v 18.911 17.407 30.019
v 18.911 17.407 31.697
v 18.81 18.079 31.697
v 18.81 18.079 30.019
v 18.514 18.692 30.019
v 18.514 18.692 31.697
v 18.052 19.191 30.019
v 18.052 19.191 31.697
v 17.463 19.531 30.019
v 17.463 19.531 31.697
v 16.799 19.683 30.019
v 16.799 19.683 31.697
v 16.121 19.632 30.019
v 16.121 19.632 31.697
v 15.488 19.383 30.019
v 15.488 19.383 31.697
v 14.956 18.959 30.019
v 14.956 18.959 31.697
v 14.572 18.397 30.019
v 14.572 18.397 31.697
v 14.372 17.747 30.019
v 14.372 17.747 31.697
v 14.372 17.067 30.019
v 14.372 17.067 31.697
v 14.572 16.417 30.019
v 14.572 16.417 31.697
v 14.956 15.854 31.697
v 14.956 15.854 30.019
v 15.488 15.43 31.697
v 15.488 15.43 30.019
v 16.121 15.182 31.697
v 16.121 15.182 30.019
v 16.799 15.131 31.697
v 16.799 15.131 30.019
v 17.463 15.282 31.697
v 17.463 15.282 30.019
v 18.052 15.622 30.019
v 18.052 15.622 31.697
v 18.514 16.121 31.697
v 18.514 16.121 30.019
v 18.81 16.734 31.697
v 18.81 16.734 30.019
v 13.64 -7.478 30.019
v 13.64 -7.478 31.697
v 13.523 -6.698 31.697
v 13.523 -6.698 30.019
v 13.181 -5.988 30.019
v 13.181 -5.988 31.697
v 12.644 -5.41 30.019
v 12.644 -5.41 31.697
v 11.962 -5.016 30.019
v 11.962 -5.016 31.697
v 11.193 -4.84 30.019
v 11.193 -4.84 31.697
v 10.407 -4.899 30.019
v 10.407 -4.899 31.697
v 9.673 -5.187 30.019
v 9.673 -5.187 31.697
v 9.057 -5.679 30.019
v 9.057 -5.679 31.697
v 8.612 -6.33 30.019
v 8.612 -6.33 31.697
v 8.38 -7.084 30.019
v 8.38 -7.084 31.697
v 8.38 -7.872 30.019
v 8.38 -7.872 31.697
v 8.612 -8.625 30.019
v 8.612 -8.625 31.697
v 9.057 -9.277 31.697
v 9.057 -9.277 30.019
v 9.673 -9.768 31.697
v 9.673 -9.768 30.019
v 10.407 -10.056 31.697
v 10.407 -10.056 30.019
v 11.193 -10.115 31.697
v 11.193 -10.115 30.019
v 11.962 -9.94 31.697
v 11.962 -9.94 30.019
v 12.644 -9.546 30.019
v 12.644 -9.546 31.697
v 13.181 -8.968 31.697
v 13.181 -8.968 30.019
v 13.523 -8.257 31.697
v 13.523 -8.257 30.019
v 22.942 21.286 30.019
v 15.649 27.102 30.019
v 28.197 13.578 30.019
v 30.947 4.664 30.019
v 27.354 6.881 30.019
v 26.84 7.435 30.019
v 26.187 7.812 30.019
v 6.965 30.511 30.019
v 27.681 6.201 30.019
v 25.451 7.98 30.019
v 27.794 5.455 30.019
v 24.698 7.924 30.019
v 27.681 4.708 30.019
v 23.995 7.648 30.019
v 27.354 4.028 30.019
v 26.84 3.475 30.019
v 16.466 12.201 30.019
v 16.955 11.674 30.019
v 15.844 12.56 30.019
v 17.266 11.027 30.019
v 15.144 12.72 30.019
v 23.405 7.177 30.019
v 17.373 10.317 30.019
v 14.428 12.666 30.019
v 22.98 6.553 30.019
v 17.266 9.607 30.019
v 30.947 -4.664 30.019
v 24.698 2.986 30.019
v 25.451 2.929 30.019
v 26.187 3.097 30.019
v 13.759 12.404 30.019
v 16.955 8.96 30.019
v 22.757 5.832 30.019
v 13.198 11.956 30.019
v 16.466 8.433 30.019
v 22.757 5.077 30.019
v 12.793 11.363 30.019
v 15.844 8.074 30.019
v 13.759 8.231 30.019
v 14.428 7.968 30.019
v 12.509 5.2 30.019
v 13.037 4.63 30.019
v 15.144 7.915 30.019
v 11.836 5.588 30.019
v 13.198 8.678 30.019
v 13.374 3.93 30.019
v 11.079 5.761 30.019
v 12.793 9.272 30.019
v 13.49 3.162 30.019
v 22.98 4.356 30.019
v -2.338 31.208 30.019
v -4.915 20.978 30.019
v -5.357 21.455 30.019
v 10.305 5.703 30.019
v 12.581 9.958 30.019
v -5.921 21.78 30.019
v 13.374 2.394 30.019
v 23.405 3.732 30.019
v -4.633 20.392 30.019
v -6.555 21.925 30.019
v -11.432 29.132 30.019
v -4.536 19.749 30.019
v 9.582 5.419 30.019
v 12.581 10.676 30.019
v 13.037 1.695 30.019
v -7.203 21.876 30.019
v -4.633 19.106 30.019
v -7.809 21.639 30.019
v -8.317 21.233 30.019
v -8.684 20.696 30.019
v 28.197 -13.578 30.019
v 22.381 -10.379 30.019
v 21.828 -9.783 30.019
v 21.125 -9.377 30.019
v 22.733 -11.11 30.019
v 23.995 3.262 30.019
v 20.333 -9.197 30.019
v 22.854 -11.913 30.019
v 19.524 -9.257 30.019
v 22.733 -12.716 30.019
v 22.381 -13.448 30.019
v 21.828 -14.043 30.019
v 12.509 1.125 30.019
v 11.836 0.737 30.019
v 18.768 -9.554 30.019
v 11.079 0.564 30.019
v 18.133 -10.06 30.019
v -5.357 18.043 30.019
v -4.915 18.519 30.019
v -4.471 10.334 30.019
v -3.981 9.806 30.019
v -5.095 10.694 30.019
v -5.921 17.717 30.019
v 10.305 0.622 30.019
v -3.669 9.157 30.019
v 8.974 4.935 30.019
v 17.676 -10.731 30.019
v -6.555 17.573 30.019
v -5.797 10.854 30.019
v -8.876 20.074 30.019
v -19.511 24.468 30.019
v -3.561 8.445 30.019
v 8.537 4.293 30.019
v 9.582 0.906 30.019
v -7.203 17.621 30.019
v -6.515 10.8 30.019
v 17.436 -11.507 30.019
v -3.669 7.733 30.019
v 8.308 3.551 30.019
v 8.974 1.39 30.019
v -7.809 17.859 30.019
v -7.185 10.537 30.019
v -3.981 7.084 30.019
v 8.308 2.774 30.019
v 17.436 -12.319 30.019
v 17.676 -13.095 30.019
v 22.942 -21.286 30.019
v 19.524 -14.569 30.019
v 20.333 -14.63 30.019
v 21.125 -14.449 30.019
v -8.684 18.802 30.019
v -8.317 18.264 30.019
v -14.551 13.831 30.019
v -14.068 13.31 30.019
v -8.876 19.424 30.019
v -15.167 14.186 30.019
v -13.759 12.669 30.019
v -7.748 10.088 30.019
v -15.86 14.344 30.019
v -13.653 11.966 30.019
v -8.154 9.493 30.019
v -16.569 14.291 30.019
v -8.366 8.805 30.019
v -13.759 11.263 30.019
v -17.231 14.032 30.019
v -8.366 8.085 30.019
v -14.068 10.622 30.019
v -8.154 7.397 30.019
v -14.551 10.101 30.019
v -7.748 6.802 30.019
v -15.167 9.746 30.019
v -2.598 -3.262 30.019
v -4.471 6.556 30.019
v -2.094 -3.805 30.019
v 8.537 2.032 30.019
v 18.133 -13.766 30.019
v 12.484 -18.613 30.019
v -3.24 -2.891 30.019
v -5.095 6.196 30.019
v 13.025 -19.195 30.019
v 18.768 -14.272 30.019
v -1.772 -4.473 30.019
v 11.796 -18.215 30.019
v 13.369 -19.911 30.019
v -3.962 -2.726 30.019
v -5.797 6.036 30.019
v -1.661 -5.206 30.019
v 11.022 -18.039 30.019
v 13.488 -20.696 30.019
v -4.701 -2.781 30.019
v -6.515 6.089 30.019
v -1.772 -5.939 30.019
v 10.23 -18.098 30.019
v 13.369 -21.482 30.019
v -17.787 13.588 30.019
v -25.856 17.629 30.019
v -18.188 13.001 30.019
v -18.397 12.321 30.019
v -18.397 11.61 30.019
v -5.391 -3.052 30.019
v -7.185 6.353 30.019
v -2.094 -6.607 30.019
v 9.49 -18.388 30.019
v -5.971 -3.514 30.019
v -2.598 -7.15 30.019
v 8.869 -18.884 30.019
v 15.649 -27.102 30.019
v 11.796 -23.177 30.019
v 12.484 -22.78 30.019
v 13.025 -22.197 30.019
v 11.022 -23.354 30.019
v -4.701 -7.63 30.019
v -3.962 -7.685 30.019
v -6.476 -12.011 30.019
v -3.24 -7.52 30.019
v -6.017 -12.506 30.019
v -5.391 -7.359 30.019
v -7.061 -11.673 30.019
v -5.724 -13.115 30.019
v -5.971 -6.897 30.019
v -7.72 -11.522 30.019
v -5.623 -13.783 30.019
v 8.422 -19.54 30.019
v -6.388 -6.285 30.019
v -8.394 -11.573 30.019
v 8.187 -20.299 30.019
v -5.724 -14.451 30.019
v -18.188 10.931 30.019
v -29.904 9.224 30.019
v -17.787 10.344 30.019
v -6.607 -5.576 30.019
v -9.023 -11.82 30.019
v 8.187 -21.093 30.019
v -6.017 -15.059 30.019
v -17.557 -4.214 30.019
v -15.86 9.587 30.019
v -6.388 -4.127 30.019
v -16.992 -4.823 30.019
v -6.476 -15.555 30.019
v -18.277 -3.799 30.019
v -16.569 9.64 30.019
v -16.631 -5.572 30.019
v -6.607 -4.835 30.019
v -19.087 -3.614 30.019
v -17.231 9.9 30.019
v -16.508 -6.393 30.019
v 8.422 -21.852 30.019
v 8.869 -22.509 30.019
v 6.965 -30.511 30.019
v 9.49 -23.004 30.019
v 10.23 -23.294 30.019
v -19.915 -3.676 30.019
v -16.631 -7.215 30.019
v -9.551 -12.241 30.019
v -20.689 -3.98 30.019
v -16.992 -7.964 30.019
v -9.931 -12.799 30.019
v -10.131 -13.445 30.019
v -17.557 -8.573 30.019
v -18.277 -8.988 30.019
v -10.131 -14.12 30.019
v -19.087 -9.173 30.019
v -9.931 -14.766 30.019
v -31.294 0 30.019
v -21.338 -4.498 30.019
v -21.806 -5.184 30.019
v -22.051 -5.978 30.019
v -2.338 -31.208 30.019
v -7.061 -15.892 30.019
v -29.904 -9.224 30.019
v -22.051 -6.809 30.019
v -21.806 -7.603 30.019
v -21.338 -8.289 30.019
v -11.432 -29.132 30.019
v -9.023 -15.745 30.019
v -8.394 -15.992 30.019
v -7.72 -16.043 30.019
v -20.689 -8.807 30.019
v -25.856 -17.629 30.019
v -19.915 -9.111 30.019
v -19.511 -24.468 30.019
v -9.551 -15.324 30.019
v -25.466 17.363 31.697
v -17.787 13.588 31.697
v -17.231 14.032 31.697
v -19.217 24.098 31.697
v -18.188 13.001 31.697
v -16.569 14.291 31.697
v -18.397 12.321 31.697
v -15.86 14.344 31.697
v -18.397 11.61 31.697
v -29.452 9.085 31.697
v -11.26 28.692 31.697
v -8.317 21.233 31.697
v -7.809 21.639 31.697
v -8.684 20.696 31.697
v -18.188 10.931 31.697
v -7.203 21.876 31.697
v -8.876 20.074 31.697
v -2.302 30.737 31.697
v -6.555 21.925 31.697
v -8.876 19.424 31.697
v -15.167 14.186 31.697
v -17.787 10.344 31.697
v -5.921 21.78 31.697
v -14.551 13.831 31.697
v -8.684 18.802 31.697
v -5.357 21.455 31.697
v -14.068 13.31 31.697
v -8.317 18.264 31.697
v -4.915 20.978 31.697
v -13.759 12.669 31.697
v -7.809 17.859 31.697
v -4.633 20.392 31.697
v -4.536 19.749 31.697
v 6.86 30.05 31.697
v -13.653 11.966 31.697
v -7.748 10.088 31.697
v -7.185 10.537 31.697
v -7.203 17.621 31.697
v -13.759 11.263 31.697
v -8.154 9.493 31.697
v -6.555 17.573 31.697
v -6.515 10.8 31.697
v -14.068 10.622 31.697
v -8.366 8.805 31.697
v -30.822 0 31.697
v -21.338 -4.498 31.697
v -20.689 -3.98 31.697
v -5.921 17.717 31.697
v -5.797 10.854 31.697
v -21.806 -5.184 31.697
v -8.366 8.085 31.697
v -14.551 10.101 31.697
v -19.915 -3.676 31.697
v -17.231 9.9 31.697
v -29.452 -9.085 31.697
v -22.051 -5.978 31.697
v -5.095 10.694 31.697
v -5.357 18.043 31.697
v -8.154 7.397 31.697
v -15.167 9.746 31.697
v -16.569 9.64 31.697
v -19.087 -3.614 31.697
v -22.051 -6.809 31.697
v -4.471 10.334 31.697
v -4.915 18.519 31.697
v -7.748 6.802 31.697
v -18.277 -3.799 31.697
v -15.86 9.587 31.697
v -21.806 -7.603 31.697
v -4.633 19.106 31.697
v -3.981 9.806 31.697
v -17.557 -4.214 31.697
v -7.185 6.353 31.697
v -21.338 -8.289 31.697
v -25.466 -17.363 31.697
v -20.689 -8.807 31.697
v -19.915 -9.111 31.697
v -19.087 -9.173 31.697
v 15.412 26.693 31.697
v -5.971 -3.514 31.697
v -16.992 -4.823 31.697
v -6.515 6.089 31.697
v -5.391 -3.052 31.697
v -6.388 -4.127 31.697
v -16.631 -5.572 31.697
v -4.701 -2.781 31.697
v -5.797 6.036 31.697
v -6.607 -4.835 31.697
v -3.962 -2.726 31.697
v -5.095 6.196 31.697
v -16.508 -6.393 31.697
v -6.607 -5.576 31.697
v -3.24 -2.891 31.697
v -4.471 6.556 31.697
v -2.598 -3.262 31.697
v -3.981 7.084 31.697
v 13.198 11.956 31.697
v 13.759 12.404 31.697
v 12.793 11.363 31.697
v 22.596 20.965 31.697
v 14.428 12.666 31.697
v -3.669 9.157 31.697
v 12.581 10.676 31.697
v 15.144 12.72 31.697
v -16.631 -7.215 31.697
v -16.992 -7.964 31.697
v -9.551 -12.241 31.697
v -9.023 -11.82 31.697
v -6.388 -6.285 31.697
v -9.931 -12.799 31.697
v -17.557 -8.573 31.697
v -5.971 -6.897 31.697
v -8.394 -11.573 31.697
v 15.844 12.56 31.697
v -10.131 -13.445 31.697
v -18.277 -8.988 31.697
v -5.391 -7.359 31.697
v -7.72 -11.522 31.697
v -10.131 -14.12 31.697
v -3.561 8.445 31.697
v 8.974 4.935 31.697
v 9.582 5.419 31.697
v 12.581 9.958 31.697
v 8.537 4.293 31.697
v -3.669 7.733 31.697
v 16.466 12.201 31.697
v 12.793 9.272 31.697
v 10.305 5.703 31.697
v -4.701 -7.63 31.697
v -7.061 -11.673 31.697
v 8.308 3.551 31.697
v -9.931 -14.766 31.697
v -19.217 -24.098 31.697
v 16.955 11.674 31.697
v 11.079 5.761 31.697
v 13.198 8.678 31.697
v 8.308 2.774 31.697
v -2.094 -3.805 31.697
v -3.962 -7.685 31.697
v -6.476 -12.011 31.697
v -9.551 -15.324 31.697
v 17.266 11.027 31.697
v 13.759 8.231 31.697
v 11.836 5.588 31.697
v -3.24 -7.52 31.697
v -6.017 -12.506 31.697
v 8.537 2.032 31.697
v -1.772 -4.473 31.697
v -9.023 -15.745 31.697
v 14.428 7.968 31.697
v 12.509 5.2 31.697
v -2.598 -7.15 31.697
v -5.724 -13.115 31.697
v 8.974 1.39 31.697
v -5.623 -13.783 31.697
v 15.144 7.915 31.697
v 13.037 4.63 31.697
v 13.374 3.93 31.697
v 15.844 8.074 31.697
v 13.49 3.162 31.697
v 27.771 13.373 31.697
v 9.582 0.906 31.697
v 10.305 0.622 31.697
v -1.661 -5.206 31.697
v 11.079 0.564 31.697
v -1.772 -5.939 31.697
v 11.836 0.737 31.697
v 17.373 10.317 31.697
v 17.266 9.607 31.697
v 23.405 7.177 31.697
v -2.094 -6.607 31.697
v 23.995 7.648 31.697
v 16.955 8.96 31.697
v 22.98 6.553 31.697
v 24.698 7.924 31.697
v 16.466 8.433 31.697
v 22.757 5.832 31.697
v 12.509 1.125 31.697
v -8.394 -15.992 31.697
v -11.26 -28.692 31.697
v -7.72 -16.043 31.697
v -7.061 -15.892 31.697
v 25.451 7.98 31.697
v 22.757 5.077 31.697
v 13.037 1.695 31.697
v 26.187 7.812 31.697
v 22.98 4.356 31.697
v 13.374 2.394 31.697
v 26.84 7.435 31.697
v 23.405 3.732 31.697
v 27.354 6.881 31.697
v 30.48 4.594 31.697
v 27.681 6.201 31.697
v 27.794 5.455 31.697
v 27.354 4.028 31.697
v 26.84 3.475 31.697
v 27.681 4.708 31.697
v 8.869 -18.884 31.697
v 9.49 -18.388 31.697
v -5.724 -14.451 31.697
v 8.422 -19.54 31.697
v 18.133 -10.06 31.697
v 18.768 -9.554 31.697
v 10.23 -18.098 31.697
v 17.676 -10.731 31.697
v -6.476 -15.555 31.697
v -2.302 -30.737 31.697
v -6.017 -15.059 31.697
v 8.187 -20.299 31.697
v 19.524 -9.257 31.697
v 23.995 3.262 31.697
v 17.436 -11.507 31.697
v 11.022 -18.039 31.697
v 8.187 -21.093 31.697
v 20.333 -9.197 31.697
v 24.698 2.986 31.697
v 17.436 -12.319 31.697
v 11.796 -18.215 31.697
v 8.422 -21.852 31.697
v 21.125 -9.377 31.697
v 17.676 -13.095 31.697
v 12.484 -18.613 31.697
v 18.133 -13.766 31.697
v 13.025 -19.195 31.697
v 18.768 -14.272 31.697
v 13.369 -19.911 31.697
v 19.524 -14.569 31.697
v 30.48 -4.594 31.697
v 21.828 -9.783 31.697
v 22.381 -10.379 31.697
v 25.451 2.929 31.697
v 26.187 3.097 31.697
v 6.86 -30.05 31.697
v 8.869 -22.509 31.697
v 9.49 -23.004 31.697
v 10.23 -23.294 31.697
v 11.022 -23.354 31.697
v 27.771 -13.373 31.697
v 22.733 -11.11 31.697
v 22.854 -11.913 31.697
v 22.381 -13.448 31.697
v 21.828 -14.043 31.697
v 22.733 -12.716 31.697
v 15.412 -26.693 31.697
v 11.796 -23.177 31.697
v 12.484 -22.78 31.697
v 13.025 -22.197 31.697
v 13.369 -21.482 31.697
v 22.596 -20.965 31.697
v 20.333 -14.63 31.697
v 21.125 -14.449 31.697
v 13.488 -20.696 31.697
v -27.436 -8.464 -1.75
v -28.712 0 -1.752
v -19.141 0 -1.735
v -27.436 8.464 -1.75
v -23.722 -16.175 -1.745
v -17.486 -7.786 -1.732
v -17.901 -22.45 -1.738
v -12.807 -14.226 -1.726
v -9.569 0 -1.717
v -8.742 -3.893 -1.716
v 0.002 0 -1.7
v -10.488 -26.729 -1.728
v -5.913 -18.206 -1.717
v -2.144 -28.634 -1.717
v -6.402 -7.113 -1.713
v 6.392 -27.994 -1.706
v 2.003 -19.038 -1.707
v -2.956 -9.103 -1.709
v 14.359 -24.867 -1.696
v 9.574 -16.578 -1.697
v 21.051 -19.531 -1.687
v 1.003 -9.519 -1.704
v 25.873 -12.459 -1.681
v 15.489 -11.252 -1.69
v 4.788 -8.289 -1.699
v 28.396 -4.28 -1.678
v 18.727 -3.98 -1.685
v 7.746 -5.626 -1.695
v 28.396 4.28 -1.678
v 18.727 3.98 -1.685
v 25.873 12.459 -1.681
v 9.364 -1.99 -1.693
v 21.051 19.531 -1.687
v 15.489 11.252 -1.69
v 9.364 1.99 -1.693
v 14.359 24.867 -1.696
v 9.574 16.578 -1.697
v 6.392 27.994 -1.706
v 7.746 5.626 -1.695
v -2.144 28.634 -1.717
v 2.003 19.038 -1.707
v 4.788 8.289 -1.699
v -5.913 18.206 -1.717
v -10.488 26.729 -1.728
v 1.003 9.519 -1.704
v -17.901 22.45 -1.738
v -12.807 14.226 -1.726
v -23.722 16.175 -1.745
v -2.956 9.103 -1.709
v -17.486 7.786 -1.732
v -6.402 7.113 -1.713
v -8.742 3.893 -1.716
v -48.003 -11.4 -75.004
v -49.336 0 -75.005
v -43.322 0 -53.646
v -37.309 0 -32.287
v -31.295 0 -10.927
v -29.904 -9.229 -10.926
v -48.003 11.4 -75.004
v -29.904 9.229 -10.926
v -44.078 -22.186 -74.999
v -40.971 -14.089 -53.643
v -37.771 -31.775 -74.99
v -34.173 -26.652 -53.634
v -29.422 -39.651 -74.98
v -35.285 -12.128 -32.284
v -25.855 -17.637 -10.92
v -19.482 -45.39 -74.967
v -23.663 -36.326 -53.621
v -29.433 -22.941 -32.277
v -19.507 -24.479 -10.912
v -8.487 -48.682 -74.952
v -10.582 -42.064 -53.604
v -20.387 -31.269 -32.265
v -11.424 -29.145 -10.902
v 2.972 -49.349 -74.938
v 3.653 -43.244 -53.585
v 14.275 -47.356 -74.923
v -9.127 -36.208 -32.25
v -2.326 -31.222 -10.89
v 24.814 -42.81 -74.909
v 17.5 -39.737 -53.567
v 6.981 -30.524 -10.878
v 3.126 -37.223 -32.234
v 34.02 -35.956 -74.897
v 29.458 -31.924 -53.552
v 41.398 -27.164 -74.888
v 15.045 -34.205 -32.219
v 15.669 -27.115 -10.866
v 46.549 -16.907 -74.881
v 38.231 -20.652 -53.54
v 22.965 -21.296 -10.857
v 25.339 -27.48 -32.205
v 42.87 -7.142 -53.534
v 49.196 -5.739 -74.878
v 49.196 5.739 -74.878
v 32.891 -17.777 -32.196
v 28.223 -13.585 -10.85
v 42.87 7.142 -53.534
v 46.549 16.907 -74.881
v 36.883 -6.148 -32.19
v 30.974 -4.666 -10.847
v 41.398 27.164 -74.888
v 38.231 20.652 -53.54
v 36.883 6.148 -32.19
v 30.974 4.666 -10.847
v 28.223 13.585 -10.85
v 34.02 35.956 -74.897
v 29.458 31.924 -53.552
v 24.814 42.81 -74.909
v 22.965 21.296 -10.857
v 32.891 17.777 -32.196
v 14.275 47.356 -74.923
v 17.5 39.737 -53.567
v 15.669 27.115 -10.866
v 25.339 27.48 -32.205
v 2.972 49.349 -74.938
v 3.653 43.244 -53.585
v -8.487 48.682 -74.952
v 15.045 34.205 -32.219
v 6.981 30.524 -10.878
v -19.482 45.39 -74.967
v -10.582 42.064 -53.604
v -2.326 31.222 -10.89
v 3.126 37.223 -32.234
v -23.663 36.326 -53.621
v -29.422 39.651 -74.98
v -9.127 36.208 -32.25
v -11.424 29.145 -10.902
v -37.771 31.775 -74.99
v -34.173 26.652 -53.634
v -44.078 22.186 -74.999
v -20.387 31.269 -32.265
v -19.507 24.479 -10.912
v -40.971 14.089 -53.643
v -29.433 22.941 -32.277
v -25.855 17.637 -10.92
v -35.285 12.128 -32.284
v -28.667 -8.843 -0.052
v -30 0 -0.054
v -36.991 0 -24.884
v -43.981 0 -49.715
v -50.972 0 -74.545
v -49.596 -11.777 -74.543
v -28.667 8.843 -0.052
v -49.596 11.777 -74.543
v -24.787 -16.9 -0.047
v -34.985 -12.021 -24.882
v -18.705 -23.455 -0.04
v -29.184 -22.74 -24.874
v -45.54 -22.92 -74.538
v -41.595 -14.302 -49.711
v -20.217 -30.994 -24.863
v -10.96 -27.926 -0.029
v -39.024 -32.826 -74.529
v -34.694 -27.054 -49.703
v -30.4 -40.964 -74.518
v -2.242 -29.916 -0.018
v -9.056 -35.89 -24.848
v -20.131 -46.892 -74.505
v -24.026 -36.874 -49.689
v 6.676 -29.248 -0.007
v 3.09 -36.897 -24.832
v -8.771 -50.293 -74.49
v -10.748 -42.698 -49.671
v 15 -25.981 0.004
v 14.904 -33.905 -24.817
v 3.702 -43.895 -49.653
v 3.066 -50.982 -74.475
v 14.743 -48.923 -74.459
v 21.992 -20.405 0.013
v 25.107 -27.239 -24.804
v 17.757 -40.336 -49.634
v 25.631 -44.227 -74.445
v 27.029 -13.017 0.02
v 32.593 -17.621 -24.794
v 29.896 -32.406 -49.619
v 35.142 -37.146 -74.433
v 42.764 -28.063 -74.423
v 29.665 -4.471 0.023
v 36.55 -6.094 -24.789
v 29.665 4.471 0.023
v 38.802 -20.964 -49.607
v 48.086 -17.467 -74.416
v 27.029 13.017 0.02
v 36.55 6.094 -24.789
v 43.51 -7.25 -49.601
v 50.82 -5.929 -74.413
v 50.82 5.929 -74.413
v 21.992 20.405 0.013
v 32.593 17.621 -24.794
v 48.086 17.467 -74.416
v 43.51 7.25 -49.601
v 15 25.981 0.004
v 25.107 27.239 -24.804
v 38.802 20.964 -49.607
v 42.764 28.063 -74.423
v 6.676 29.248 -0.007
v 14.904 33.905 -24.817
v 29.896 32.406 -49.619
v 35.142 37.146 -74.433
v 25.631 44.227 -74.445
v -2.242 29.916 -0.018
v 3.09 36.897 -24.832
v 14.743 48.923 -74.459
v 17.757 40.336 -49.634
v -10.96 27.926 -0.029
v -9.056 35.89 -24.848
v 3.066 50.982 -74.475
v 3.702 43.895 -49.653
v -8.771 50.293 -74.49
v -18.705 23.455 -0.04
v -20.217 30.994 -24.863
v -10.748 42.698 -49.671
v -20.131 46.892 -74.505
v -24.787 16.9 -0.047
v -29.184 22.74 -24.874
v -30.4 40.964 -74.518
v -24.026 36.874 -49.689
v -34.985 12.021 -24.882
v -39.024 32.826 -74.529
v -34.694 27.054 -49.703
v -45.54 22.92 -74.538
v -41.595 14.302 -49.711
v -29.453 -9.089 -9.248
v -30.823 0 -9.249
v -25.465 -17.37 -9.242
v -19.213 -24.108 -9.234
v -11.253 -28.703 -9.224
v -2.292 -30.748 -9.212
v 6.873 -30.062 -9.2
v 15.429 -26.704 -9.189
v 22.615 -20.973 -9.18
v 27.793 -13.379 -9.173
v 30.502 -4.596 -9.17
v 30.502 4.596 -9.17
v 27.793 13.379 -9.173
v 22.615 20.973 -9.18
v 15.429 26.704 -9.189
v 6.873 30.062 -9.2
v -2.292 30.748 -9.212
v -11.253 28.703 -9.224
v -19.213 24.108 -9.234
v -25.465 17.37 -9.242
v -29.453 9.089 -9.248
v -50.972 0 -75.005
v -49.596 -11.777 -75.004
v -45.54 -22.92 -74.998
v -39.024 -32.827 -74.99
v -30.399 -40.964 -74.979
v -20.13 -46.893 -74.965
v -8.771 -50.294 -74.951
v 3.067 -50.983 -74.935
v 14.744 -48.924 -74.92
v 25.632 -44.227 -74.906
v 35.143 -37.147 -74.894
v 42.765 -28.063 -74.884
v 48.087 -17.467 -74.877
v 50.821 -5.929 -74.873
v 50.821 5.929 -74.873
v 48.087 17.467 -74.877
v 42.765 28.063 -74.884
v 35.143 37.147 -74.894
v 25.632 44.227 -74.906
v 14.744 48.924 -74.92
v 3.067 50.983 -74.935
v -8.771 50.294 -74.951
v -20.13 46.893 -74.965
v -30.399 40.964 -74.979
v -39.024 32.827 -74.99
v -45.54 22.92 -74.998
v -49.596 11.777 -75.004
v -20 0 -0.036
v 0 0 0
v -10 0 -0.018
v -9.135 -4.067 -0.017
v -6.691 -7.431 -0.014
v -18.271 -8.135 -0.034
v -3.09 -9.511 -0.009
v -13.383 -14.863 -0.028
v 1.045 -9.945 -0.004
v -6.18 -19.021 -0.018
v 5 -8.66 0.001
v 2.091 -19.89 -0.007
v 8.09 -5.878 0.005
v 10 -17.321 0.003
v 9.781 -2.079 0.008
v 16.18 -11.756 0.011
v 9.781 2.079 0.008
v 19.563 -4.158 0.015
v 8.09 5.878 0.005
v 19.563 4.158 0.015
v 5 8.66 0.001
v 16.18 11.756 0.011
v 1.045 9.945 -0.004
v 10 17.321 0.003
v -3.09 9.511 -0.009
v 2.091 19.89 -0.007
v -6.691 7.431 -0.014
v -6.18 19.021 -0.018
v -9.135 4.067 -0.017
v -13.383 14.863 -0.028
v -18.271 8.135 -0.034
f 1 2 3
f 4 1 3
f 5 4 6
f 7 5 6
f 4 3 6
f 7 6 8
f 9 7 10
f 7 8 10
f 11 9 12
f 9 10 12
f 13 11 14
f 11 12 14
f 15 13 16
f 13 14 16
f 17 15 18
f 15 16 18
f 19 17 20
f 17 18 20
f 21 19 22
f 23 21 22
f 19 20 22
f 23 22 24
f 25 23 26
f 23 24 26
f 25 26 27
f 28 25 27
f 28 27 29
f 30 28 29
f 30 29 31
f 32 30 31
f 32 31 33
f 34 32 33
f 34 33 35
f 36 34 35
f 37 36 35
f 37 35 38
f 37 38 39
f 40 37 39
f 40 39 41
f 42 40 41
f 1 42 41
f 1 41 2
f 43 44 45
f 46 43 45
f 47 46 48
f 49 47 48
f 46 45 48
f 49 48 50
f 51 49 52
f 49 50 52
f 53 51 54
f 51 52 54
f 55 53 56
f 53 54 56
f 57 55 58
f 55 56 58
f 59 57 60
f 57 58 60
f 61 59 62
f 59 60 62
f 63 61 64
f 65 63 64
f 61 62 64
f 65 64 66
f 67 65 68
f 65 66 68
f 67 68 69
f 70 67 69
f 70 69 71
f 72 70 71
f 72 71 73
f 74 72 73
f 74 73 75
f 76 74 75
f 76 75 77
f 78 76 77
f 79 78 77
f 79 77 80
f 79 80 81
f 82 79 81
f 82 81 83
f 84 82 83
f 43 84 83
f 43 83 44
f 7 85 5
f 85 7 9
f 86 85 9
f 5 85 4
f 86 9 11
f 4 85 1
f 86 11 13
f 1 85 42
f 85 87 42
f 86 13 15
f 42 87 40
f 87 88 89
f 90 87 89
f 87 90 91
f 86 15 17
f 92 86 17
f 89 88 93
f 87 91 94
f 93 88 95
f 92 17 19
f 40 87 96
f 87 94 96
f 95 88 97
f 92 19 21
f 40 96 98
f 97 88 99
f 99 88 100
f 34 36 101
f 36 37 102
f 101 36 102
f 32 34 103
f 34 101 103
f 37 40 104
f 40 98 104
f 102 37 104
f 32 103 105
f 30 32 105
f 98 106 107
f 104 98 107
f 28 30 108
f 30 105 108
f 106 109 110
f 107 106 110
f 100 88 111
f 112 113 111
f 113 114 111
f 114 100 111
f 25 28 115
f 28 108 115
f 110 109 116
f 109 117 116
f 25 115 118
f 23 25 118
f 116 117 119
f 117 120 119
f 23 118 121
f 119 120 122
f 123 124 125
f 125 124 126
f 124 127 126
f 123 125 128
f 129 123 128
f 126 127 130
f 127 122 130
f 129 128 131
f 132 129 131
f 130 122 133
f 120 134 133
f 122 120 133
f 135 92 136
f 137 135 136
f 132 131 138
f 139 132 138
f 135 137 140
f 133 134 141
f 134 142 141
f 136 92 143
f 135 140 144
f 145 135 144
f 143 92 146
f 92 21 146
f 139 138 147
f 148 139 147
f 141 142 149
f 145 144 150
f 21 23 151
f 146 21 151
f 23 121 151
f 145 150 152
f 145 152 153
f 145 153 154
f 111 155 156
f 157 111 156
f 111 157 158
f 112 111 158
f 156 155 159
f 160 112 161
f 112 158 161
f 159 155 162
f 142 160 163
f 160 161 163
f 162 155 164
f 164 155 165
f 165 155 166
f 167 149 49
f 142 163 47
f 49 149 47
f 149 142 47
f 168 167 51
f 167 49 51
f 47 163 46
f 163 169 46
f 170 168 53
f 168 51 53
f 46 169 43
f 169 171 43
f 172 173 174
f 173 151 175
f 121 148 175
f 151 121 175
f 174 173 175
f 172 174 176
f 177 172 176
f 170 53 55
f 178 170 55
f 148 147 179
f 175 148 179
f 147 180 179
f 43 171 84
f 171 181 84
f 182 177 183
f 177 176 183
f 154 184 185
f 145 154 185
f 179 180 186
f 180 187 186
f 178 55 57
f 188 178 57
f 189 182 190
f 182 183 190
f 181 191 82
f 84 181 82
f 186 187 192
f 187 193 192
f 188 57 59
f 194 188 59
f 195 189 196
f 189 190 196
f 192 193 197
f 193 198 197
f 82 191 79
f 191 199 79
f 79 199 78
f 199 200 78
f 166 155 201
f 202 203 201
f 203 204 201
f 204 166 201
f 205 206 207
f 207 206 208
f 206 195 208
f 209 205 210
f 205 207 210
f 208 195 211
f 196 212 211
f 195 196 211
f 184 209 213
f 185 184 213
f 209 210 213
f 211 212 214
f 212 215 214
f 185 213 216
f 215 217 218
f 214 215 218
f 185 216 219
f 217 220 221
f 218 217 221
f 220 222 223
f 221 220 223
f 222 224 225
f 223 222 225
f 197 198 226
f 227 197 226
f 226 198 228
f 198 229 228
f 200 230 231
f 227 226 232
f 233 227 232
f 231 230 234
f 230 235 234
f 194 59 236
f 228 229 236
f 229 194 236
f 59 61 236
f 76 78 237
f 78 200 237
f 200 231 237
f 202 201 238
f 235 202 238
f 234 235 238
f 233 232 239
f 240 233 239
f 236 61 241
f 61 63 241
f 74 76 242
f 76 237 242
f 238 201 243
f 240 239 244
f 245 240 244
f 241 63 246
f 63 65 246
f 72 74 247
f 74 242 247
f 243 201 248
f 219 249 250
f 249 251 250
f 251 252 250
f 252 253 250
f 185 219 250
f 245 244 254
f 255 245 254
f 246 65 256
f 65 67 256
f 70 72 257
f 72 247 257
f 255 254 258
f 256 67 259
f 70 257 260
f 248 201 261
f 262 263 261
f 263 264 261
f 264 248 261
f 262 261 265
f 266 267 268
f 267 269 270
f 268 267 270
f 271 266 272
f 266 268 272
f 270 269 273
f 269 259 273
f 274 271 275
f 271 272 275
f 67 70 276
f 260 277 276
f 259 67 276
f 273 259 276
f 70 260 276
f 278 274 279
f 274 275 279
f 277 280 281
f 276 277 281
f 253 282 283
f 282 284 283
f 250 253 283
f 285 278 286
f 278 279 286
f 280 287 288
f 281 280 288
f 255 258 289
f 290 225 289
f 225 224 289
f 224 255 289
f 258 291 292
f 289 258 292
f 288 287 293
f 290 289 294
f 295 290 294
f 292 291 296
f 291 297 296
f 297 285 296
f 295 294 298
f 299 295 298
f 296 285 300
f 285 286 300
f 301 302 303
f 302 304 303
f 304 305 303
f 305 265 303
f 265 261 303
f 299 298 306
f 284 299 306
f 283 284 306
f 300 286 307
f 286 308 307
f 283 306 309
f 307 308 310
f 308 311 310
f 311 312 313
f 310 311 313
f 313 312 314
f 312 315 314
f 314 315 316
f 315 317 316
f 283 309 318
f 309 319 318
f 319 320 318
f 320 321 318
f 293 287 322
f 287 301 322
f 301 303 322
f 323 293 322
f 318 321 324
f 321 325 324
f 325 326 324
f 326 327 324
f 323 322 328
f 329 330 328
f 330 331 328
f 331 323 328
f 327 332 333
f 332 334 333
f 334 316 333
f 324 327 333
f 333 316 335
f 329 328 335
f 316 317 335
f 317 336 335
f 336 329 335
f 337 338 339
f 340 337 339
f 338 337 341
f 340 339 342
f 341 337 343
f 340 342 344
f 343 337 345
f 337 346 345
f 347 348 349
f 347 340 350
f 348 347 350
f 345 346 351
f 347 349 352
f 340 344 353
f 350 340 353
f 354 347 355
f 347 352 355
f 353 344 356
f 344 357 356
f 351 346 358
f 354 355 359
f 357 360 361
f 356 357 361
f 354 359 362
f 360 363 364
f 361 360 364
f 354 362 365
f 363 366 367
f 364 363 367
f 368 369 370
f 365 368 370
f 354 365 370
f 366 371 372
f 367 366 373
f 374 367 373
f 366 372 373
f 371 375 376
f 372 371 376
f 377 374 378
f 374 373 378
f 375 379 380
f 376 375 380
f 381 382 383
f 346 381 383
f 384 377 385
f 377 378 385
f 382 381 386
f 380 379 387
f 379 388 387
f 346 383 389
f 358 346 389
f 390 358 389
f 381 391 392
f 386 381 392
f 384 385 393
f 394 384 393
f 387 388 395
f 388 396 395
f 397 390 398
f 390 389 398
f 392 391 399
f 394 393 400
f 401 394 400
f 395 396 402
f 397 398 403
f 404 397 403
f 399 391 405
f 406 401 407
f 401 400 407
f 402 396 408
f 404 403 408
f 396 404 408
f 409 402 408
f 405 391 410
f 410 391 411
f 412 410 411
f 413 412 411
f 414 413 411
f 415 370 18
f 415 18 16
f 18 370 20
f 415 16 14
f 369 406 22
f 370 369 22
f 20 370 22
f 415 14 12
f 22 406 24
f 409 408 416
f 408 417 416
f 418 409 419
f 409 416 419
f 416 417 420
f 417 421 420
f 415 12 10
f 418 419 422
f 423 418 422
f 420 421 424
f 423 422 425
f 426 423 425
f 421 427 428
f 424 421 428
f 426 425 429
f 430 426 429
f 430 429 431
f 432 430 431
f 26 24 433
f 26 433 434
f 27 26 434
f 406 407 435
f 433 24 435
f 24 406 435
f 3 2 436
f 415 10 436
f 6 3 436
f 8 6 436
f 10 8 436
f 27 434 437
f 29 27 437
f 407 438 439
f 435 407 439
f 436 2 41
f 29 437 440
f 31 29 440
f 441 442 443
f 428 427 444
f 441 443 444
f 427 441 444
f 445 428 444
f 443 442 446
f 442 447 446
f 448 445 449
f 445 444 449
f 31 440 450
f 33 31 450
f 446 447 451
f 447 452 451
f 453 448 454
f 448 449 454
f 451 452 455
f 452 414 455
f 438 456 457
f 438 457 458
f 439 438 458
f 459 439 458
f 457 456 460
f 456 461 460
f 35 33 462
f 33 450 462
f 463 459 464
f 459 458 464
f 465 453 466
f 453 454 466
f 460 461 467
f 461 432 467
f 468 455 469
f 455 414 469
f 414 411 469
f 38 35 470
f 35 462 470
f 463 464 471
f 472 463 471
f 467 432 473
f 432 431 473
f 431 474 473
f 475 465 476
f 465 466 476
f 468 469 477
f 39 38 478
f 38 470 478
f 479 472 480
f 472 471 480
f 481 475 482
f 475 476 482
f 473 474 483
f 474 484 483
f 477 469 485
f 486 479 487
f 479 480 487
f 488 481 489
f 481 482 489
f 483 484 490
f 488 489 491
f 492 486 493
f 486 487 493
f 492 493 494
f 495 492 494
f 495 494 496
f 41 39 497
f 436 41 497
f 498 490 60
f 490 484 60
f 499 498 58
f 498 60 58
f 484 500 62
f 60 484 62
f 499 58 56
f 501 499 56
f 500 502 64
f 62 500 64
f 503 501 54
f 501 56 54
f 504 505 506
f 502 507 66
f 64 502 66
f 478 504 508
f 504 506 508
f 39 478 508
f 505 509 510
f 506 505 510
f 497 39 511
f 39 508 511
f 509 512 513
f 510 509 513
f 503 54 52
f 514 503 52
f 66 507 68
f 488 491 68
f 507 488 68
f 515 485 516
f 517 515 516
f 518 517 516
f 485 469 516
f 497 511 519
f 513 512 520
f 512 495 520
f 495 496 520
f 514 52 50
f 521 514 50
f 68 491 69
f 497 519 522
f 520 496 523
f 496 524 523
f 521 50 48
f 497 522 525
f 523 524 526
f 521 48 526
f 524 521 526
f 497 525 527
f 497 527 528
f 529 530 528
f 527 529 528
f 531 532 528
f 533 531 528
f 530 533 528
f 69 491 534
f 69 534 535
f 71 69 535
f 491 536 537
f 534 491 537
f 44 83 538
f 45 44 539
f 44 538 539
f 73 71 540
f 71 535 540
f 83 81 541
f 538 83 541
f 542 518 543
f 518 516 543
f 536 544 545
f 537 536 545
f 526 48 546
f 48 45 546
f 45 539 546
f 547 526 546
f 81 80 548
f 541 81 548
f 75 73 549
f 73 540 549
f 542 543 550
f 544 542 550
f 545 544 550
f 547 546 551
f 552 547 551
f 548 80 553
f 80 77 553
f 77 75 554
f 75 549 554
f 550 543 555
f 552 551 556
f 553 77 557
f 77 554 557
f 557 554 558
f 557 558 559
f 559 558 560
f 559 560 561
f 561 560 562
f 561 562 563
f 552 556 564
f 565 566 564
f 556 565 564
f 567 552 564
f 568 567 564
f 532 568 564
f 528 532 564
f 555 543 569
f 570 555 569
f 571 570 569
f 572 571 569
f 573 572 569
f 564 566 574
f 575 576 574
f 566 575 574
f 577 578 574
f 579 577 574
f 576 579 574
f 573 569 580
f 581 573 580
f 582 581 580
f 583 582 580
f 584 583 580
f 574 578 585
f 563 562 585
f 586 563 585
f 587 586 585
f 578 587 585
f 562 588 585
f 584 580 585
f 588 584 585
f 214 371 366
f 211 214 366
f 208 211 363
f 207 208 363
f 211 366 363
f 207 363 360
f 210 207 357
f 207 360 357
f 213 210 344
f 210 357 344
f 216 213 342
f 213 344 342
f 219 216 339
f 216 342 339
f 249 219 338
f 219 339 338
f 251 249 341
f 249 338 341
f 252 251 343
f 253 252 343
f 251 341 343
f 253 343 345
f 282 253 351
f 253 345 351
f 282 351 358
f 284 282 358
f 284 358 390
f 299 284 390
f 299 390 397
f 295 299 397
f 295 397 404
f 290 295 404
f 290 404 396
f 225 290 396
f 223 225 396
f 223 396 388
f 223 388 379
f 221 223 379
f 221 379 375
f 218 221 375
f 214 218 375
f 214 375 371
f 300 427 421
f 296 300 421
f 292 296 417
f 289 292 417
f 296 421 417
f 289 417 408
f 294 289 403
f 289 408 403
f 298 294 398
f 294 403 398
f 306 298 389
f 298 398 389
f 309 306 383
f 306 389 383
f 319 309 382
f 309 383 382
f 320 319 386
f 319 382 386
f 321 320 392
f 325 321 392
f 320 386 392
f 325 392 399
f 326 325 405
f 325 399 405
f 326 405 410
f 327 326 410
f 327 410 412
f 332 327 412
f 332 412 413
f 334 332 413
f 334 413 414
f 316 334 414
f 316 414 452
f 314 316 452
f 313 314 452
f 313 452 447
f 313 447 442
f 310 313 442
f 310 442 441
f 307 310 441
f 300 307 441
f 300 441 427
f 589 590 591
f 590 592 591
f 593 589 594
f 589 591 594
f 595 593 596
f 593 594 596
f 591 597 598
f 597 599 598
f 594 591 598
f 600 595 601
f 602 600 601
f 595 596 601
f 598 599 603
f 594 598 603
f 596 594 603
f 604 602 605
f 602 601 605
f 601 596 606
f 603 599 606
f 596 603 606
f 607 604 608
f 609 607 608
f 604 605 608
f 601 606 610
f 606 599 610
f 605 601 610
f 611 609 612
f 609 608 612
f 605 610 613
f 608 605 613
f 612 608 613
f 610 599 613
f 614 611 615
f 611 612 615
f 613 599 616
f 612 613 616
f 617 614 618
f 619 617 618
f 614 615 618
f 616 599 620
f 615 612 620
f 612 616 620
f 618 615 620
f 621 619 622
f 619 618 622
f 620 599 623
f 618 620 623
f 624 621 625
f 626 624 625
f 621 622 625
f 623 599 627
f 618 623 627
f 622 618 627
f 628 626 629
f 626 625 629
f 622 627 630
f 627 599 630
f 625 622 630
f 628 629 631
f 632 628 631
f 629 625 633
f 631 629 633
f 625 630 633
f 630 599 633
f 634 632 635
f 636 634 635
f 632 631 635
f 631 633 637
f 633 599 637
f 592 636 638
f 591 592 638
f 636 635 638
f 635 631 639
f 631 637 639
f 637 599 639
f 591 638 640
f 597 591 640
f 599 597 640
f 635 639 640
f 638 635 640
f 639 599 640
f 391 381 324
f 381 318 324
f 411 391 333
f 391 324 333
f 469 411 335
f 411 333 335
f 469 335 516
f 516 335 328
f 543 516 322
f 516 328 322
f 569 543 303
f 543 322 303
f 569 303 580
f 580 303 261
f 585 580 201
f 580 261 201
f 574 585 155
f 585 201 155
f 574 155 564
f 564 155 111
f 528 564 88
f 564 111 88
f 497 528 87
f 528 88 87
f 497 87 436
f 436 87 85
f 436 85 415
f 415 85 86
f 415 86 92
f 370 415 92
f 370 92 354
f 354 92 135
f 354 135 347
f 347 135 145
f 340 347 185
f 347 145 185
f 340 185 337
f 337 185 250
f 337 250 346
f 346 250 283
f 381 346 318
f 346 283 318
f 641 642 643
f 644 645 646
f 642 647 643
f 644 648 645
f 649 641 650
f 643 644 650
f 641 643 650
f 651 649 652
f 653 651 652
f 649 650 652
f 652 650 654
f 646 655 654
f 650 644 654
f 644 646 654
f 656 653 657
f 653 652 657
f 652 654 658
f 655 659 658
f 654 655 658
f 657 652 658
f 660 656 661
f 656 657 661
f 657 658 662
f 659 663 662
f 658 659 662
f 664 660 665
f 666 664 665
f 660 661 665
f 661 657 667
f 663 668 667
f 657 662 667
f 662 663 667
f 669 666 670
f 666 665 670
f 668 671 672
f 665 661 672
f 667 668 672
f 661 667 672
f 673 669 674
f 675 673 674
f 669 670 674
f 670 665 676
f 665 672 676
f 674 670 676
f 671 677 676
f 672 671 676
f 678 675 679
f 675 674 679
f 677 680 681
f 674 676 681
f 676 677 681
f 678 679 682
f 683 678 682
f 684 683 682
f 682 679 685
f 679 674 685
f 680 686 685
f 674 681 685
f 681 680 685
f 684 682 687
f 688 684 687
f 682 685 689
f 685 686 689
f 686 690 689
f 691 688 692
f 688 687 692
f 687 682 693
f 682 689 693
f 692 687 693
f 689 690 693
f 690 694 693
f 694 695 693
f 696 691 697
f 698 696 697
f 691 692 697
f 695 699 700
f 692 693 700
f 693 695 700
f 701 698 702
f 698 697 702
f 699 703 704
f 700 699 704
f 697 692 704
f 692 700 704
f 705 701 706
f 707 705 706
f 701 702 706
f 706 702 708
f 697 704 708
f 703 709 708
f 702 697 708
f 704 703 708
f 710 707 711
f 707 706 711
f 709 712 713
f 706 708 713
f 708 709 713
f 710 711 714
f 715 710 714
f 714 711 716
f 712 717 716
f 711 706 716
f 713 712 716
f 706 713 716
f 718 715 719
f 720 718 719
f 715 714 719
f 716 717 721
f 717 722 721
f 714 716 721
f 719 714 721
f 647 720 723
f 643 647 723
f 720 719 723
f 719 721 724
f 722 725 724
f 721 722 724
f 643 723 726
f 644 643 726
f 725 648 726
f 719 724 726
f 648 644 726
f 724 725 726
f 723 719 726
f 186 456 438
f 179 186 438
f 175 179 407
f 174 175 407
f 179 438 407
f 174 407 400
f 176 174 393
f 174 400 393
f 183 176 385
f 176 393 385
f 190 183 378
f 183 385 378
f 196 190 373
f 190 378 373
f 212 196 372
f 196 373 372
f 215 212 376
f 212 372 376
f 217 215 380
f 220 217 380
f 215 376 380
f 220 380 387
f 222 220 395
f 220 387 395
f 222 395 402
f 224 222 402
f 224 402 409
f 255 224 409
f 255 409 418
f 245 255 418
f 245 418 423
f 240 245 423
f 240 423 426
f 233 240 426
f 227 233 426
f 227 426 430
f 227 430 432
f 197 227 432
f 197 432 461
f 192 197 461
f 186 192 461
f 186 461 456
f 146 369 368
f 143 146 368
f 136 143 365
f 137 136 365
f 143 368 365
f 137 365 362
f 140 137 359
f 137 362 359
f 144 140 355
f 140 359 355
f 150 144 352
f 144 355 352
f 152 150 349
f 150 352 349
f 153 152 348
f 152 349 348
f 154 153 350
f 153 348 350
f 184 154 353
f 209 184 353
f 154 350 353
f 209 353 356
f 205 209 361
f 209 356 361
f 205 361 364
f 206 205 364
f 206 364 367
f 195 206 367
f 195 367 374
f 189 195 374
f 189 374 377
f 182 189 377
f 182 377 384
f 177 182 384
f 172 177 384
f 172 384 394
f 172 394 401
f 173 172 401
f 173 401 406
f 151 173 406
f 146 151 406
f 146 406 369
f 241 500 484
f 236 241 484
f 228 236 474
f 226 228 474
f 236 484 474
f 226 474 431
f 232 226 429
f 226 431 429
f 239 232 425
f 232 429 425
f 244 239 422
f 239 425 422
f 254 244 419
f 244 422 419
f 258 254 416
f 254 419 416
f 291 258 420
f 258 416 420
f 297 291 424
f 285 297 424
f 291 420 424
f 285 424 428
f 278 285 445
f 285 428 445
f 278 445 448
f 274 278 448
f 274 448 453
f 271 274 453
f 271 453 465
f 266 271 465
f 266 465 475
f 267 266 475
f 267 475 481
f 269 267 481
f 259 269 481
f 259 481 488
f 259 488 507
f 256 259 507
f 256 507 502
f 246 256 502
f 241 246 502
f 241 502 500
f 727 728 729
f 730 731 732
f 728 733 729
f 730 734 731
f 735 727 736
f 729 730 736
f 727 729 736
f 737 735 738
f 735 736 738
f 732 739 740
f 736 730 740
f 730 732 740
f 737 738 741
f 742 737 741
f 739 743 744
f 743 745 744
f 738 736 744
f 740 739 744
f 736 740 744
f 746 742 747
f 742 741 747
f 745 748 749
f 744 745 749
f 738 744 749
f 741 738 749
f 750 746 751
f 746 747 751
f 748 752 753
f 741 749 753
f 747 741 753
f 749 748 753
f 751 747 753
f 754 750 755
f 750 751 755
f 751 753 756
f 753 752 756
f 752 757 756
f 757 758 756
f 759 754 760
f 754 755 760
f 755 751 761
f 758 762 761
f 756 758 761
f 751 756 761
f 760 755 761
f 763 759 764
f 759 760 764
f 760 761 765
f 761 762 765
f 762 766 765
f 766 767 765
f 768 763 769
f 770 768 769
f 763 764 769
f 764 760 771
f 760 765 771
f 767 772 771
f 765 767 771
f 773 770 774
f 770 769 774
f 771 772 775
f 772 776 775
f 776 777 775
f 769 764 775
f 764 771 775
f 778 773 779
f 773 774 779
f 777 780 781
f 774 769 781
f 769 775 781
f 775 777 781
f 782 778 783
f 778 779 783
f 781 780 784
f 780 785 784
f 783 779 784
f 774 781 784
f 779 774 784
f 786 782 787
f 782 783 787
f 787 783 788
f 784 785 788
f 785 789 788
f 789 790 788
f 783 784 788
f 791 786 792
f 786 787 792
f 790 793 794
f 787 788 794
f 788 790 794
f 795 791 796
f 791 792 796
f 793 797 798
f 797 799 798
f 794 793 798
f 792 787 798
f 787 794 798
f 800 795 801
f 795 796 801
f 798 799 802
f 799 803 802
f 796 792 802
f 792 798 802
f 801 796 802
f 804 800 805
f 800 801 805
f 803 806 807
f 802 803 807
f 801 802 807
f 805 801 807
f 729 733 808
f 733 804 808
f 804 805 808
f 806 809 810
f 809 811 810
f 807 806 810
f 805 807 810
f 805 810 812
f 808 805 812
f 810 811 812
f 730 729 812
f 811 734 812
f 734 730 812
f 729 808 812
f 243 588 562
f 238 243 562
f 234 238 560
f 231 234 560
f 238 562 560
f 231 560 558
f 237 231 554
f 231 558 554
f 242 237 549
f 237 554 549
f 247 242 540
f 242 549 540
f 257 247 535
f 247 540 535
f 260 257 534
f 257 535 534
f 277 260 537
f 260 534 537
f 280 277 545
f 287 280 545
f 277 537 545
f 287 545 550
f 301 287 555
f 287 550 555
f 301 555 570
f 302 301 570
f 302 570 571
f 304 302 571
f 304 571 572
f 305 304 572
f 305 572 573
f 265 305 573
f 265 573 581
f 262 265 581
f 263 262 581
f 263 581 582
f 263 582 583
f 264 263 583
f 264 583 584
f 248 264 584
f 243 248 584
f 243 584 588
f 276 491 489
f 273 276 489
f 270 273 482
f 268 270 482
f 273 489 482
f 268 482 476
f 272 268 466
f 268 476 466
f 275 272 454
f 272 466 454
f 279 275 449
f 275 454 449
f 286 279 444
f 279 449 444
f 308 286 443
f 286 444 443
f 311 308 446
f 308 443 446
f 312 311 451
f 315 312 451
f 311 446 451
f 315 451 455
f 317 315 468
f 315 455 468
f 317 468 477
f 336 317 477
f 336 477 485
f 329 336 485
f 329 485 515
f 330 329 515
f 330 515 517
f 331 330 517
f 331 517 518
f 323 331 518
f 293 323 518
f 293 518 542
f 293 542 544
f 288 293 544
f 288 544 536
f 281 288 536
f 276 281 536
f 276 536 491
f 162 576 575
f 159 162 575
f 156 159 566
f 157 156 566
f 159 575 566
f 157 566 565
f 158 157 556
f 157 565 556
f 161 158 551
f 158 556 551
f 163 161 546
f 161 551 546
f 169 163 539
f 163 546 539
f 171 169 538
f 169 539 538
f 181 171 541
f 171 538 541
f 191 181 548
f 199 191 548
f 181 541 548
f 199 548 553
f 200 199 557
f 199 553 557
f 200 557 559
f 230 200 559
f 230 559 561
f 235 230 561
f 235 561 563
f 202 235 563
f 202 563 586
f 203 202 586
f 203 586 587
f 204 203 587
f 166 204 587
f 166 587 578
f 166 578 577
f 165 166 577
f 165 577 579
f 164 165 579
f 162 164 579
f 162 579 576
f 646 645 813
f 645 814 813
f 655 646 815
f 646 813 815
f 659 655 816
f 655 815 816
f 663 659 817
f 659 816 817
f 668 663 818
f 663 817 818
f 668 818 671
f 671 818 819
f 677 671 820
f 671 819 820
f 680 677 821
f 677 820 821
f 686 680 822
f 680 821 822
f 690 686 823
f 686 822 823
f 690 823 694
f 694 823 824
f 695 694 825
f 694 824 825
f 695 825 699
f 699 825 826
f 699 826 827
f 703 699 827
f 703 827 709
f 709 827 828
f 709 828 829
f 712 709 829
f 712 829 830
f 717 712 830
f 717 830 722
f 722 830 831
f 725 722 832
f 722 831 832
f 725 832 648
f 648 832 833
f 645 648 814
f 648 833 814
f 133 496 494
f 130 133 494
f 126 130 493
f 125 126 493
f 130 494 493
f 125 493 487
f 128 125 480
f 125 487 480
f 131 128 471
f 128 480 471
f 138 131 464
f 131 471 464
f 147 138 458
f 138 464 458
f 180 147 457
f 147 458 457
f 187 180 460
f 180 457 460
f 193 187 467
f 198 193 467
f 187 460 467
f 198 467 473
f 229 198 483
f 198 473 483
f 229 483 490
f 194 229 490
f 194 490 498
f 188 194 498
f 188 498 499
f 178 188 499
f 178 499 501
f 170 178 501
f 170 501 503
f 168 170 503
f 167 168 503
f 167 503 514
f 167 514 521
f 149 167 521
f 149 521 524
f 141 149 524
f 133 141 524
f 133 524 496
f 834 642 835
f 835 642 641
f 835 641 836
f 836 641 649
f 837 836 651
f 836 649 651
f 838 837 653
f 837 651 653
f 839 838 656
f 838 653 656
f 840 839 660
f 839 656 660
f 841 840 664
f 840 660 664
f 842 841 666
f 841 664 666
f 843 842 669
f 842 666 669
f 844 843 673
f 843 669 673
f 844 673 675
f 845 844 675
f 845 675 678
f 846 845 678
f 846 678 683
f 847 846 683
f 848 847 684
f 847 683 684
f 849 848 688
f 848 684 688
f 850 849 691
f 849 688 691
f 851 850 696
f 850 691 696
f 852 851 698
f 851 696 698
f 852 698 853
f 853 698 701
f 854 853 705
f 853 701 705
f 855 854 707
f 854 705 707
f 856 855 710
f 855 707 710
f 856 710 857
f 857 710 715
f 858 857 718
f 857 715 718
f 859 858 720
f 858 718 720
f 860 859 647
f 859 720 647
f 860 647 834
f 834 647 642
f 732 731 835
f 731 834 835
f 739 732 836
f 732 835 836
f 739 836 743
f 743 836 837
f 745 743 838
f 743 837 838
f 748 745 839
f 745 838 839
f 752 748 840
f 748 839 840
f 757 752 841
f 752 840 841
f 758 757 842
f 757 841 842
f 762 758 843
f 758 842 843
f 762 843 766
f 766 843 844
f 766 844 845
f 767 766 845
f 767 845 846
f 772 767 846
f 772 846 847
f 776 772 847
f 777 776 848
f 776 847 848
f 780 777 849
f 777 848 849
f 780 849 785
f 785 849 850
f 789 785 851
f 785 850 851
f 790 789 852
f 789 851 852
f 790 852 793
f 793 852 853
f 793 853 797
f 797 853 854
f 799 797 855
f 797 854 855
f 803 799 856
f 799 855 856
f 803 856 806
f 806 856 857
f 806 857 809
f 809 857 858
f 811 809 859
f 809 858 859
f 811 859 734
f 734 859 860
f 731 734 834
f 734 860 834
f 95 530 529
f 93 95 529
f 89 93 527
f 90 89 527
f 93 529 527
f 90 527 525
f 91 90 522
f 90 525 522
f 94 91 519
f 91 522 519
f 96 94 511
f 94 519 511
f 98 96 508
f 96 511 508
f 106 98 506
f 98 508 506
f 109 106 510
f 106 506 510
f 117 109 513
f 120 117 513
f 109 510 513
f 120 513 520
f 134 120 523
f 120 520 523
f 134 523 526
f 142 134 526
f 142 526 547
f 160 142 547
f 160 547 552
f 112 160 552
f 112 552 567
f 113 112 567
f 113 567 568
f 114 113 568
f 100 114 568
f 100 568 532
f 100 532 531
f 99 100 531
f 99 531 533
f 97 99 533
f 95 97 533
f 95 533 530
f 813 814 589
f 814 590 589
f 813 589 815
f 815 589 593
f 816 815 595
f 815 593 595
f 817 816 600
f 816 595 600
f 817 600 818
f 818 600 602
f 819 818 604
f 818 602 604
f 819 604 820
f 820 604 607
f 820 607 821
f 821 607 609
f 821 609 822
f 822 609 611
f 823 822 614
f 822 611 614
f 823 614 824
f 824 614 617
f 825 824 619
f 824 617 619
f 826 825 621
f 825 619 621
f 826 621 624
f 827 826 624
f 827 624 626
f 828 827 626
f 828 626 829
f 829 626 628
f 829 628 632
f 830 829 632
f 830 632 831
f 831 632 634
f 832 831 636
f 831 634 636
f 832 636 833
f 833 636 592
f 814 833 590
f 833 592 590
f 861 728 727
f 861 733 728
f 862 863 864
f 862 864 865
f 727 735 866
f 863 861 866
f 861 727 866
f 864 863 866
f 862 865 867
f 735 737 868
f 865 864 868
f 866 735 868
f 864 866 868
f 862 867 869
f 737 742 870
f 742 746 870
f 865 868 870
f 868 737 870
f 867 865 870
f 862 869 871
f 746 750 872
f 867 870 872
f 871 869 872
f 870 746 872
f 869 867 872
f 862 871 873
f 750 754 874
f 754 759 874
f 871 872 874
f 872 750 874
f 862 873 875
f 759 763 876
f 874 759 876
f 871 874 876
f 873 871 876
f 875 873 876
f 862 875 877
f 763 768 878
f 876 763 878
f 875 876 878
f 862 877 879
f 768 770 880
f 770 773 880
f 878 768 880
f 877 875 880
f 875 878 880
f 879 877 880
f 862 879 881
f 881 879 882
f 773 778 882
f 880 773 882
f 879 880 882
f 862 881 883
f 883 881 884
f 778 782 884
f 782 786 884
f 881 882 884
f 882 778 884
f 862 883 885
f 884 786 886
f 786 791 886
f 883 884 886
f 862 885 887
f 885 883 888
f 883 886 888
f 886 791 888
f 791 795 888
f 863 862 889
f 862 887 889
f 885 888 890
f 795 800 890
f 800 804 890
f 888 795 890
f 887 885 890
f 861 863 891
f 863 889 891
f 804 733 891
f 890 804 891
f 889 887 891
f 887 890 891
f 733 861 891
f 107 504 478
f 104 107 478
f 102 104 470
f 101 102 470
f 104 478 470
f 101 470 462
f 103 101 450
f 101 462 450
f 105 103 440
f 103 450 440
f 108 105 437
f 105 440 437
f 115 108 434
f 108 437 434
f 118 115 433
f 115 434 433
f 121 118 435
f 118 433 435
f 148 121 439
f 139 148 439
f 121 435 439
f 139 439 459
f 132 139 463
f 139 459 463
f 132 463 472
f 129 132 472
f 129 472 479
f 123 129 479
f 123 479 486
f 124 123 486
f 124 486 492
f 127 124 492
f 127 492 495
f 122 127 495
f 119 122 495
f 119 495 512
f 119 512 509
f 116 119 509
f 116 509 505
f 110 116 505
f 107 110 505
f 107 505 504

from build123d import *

# Parameters (mm, degrees)
F3_R     = 2.2664250342
F3_R_2   = 2.1822297353
F3_R_3   = 2.282281141
F3_R_4   = 2.64483265
F3_R_5   = 2.7240512482
F3_R_6   = 2.6649914966
F3_R_7   = 2.6057239863
F3_R_8   = 2.4093813538
F3_R_9   = 2.5323750002
F3_R_10  = 2.4159586068
F3_R_11  = 2.3852052253
F3_R_12  = 2.4866511686
F3_R_13  = 2.7873706171
F4_DEPTH = 2.1


with BuildPart() as f1:
    # F0 (on Front) → F1 (revolve)
    with BuildSketch(Plane.XZ):
        Polygon((0, 0), (-30, -0.0542007617), (-50.9721353226, -74.5447462469), (-50.9721353226, -75.0054545931), (-49.3357537386, -75.0054545931), (-31.2951667125, -10.9274221097), (-30.8227315443, -9.2493882403), (-28.7118752785, -1.751876315), (0.0022064812, -1.6999988116), align=None)
    revolve(axis=Axis((0.0011032406, 0, -0.8499994058), (-0.0012979299, 0, 0.9999991577)))


with BuildPart() as f2:
    # F0 (on Front) → F2 (revolve)
    with BuildSketch(Plane.XZ):
        Polygon((0.0010570226, 30.0191346799), (0.0010570226, 31.6971685494), (-30.8216745217, 31.6971685494), (-31.2941096899, 30.0191346799), align=None)
    revolve(axis=Axis((0.0010570226, 0, 30.8581516147), (0, 0, 1)))

    # F3 (on face) → F4 (cut)
    with BuildSketch(Plane.XY.offset(31.6971685494)):
        with Locations((-7.8894328326, -13.7825533748)):
            Circle(F3_R)
        with Locations((-6.7177857272, 19.7487901896)):
            Circle(F3_R_2)
        with Locations((16.6287105531, 17.406752333)):
            Circle(F3_R_3)
        with Locations((10.9953926876, -7.4778213166)):
            Circle(F3_R_4)
        with Locations((20.129904151, -11.9132352993)):
            Circle(F3_R_5)
        with Locations((10.8226593584, -20.6961706281)):
            Circle(F3_R_6)
        with Locations((10.8844479546, 3.162371926)):
            Circle(F3_R_7)
        with Locations((14.9638019502, 10.3172091767)):
            Circle(F3_R_8)
        with Locations((25.2614617348, 5.4547316395)):
            Circle(F3_R_9)
        with Locations((-5.977217108, 8.4447944537)):
            Circle(F3_R_10)
        with Locations((-16.0386115313, 11.9658950716)):
            Circle(F3_R_11)
        with Locations((-4.1480776854, -5.2057215944)):
            Circle(F3_R_12)
        with Locations((-19.2948821932, -6.39344519)):
            Circle(F3_R_13)
    extrude(amount=-F4_DEPTH, mode=Mode.SUBTRACT)


solid = Compound([f1.part, f2.part])
